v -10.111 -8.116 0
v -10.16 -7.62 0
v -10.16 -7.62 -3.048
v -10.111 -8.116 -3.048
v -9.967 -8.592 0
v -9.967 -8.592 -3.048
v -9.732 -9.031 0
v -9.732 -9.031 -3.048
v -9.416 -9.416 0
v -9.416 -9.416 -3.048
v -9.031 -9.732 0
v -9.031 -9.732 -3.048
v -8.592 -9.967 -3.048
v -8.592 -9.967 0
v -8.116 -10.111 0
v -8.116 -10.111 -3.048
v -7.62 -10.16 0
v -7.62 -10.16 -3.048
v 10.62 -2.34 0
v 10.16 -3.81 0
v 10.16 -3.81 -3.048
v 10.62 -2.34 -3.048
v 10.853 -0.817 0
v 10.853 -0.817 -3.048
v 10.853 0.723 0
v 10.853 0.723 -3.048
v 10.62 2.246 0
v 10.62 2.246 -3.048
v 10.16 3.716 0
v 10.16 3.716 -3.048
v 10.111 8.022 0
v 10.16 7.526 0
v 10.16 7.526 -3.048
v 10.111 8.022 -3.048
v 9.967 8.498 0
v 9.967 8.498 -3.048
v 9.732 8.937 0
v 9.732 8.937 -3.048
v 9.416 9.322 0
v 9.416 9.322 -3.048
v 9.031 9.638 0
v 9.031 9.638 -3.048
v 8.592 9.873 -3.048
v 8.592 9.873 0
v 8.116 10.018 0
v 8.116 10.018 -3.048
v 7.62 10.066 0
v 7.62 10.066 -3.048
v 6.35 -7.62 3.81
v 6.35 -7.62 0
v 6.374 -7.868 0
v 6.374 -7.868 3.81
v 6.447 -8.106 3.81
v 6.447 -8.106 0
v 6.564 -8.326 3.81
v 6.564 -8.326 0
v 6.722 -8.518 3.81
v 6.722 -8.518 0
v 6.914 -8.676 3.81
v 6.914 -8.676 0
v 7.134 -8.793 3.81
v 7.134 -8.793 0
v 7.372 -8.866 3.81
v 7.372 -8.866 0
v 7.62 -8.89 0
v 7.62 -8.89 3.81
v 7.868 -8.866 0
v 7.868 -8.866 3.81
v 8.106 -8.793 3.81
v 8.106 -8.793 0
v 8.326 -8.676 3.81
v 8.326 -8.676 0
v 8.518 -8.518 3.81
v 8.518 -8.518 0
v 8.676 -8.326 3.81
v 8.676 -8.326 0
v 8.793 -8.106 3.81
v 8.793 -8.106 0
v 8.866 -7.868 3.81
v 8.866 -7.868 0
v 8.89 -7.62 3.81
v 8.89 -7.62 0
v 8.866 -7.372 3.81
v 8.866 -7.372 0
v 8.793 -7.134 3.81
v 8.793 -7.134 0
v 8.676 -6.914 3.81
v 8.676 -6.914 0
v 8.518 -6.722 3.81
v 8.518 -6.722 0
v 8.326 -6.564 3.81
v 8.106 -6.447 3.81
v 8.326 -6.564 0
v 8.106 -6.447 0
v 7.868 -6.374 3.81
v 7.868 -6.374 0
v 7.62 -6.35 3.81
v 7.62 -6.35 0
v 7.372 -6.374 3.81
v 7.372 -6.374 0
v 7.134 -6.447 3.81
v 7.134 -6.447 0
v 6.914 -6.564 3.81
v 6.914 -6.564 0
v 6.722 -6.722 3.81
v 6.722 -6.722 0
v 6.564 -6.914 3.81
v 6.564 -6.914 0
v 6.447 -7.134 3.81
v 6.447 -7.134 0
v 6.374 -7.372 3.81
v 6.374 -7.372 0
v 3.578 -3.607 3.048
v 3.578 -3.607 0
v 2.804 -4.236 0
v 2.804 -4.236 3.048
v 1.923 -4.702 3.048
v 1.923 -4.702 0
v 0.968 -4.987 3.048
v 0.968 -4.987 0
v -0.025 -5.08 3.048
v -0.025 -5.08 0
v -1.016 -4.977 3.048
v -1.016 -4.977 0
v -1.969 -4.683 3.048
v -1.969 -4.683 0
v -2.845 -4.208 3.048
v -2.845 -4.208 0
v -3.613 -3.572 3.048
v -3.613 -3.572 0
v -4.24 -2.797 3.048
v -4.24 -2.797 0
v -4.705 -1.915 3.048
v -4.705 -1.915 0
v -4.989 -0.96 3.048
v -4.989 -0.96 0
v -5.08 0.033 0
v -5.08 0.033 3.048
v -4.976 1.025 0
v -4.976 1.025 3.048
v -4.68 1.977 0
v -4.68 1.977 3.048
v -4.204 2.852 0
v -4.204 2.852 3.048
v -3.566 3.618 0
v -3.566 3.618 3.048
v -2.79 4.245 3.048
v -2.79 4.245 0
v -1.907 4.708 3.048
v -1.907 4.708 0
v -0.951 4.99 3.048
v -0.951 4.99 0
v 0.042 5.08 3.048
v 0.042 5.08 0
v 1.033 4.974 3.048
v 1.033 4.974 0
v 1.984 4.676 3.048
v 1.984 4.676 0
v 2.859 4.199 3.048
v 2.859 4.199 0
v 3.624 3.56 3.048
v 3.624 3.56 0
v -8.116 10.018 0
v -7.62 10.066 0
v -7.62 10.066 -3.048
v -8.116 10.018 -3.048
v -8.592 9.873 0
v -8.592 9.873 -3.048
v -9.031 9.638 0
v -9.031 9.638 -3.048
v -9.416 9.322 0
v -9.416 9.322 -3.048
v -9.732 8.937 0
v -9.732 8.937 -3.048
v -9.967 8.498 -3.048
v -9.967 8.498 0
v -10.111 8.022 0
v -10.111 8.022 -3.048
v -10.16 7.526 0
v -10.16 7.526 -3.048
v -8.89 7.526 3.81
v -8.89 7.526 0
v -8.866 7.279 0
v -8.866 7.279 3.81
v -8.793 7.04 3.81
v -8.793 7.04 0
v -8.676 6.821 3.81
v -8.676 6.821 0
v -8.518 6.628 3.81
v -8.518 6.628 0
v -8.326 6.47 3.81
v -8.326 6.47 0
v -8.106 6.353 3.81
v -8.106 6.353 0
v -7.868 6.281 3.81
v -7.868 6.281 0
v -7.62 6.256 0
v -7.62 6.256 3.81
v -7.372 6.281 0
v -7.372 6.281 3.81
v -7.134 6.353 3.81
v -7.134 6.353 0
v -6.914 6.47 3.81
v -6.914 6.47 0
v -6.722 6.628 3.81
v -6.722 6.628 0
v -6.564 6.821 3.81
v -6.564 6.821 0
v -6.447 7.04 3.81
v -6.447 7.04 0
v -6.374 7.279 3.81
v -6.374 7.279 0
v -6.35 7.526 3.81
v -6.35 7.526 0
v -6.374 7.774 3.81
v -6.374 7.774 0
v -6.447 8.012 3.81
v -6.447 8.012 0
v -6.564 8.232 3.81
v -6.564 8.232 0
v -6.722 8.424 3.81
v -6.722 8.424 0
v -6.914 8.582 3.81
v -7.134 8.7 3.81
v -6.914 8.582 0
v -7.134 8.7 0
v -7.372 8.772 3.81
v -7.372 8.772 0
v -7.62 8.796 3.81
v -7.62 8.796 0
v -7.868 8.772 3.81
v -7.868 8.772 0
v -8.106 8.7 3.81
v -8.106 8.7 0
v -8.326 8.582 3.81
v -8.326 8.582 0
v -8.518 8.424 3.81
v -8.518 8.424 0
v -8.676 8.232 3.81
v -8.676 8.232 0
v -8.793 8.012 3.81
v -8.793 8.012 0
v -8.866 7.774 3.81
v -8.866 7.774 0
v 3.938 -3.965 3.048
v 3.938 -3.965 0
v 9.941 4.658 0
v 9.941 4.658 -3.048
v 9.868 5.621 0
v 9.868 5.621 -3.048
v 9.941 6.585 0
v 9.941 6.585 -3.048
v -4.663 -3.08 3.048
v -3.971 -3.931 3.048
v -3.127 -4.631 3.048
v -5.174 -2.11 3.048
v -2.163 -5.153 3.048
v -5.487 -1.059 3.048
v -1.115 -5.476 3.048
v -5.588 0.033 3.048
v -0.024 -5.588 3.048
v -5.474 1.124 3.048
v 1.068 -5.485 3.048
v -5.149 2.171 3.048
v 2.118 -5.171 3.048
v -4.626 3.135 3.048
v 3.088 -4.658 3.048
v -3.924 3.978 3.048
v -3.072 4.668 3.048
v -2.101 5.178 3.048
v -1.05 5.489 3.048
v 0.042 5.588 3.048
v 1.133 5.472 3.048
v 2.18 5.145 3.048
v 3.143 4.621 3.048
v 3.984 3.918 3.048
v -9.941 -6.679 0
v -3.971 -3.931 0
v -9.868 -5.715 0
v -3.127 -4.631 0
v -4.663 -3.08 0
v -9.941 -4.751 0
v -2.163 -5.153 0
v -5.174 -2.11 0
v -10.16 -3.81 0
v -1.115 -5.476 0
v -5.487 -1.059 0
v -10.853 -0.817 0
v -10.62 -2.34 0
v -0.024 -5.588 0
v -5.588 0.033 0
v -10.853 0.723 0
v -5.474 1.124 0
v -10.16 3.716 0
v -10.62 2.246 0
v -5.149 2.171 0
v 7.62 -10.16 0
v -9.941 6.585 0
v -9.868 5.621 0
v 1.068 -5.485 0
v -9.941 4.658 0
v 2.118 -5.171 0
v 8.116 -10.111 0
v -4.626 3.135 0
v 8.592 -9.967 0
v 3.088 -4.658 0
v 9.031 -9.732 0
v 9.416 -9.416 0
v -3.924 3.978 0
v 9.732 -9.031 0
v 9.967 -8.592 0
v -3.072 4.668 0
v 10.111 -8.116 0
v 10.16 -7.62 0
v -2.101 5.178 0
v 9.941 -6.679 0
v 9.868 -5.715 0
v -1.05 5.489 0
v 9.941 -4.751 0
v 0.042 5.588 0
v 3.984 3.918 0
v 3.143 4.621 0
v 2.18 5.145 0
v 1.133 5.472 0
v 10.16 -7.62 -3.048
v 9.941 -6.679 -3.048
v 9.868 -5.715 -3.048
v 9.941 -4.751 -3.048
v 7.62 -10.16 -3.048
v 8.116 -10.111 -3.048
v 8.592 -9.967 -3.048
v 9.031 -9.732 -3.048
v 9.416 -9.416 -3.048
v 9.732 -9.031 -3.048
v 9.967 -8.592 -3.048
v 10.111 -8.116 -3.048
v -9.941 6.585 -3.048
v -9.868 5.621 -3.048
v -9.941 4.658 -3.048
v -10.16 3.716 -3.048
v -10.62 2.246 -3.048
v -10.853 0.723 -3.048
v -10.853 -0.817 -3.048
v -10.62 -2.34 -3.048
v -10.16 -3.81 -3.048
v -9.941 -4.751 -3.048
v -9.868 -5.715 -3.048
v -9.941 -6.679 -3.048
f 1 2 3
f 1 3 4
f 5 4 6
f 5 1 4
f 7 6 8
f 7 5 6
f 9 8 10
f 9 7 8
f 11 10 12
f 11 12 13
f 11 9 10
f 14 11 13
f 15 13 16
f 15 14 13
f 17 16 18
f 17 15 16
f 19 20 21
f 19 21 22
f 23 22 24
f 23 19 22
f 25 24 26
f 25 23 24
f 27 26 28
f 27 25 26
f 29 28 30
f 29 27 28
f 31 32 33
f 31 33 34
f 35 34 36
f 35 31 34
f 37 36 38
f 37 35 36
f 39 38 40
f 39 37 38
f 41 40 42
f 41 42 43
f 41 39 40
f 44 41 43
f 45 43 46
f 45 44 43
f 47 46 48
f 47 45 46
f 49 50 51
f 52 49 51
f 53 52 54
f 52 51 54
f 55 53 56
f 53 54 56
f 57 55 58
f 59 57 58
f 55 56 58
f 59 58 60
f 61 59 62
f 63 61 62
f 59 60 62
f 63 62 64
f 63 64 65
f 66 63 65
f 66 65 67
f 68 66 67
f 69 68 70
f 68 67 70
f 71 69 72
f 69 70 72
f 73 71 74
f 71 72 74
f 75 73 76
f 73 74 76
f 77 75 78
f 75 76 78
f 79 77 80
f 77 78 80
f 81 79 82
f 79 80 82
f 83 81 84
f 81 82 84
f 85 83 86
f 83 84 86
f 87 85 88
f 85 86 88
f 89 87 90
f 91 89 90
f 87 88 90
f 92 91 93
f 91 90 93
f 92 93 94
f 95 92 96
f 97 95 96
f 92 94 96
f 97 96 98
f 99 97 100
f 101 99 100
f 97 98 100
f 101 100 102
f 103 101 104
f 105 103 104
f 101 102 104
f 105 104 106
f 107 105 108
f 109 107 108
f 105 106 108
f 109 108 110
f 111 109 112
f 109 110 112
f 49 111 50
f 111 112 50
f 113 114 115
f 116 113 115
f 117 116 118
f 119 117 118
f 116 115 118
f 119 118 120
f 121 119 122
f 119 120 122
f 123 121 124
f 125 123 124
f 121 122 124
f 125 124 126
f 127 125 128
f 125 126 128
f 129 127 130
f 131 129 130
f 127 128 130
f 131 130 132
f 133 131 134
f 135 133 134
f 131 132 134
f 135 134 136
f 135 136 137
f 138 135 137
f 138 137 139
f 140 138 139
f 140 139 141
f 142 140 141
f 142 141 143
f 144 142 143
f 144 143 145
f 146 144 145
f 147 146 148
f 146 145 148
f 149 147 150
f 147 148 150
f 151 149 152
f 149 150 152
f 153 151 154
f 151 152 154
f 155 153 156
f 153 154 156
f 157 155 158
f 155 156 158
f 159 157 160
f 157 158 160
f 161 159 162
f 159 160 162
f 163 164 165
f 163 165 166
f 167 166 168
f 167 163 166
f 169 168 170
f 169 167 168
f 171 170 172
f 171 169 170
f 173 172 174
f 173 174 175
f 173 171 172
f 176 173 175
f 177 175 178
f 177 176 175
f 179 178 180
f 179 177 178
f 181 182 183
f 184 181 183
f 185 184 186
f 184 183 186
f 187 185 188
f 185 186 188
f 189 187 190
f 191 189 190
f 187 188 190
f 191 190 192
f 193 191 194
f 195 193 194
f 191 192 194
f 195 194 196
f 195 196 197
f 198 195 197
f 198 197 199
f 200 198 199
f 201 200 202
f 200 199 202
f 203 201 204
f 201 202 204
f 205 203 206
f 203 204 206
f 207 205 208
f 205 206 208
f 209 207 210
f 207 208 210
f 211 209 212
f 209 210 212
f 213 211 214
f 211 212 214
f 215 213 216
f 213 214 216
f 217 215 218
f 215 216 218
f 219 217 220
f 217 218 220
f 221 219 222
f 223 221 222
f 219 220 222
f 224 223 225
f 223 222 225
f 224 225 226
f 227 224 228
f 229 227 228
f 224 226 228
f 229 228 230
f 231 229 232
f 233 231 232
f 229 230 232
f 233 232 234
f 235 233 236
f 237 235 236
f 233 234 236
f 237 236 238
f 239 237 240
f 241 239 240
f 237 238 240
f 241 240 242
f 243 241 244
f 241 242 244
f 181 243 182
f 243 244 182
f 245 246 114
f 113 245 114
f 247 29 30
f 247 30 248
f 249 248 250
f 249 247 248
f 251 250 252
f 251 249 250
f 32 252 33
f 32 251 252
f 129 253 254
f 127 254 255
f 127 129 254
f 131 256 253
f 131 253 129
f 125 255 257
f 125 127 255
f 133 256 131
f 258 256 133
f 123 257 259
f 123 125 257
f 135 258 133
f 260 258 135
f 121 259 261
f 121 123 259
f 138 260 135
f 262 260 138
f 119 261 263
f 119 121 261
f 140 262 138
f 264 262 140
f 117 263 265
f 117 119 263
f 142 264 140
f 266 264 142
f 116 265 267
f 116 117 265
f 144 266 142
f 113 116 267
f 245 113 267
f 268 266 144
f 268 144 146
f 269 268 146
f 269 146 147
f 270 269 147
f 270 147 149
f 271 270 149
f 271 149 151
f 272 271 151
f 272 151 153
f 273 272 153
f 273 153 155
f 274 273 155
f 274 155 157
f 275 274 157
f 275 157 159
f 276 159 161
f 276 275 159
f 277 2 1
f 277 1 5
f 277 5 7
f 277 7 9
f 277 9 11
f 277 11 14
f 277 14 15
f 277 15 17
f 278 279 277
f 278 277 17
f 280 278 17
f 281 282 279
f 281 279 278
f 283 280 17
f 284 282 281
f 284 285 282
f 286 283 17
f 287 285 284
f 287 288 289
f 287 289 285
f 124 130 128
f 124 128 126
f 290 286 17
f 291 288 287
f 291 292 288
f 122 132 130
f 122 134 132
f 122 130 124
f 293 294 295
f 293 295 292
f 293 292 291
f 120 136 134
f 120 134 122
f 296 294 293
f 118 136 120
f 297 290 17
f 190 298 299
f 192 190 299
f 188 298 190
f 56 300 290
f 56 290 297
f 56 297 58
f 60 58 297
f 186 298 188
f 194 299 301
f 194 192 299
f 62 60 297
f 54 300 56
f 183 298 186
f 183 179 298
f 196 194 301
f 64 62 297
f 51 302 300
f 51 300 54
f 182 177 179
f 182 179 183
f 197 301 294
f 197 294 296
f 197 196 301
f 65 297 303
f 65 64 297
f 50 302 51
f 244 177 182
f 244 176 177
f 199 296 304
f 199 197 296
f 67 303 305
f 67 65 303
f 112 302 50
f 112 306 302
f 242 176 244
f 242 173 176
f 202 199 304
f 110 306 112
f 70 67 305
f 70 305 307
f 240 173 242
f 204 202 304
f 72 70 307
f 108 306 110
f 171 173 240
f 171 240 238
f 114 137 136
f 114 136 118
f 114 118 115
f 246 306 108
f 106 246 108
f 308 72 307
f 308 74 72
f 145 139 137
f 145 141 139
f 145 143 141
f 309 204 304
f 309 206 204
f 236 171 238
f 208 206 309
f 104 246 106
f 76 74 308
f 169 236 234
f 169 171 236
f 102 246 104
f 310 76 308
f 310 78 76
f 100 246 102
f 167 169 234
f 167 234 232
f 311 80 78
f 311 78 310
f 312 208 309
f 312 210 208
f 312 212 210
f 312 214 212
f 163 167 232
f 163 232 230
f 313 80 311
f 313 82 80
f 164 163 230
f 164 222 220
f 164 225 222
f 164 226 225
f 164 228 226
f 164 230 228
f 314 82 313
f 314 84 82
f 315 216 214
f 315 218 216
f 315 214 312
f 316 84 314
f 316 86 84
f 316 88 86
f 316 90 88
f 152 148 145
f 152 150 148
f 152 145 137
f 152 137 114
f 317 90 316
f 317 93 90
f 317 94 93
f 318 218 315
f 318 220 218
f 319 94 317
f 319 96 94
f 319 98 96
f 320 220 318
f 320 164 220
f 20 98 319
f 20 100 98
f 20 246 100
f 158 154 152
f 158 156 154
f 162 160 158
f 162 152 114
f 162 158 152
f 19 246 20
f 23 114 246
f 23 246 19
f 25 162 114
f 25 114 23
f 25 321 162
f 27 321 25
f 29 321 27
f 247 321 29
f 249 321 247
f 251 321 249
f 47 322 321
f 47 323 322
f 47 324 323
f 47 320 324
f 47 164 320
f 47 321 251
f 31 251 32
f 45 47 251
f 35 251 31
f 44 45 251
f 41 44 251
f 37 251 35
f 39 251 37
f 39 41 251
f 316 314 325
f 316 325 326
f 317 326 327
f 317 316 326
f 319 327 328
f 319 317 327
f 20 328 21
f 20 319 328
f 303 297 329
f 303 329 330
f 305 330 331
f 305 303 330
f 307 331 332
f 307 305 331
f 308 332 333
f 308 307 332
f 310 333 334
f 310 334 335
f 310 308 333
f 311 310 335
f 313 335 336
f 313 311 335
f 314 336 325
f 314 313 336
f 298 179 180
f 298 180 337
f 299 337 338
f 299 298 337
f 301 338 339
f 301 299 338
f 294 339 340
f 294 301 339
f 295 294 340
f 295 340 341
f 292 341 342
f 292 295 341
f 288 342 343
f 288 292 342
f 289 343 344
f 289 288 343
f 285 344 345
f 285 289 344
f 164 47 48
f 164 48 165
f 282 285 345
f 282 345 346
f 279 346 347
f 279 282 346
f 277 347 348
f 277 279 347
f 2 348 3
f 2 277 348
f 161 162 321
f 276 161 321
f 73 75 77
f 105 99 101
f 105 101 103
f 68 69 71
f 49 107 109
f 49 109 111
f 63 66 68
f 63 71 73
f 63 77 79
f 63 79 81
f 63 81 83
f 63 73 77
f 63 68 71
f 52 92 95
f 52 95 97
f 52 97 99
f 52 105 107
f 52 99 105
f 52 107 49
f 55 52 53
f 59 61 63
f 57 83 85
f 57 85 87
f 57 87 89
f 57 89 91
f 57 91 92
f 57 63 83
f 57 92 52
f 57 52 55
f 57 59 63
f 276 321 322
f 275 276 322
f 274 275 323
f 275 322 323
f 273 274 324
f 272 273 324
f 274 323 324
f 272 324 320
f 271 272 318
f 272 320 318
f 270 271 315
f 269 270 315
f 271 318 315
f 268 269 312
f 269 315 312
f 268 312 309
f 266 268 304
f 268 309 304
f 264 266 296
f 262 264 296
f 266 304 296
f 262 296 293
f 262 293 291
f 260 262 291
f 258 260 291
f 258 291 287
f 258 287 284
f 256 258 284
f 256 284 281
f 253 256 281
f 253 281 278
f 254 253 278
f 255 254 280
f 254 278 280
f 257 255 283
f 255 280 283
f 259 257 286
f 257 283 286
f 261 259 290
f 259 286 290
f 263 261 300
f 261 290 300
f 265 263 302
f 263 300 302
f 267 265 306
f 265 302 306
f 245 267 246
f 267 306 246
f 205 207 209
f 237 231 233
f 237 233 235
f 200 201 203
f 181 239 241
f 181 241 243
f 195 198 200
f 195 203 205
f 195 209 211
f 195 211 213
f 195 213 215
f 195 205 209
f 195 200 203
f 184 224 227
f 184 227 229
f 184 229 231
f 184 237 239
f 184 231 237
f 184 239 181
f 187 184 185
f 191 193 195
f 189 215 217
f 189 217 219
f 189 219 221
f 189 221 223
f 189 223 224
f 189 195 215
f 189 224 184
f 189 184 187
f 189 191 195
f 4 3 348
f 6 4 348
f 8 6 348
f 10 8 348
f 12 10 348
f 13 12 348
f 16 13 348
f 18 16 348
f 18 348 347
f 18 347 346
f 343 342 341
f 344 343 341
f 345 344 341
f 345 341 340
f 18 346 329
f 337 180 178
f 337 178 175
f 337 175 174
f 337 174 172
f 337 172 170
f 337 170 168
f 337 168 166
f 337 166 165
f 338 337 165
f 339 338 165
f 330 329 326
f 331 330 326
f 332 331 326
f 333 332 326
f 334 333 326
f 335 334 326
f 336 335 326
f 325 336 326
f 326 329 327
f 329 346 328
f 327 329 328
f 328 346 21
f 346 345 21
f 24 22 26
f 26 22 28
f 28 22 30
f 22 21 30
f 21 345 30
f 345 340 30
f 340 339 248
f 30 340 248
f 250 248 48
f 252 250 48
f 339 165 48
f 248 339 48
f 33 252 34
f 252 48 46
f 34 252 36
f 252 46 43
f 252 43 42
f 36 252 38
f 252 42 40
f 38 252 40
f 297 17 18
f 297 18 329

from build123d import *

# Parameters (mm, degrees)
BOSS_EXTRUDE5_DEPTH = 3.048
BOSS_EXTRUDE6_DEPTH = 3.048
PRONGS_R            = 1.27
BOSS_EXTRUDE7_DEPTH = 3.81


with BuildPart() as part:
    # Back Plate → Boss-Extrude5 (new body)
    with BuildSketch(Plane.XY):
        with BuildLine():
            Line((0, -10.16), (7.62, -10.16))
            ThreePointArc((7.62, -10.16), (9.416051224, -9.416051224), (10.16, -7.62))
            ThreePointArc((10.16, -7.62), (9.867513929, -5.715), (10.16, -3.81))
            ThreePointArc((10.16, -3.81), (10.882617987, -0.046833682), (10.16, 3.716332637))
            ThreePointArc((10.16, 3.716332637), (9.867513929, 5.621332637), (10.16, 7.526332637))
            ThreePointArc((10.16, 7.526332637), (9.416051224, 9.322383861), (7.62, 10.066332637))
            Line((7.62, 10.066332637), (-7.62, 10.066332637))
            ThreePointArc((-7.62, 10.066332637), (-9.416051224, 9.322383861), (-10.16, 7.526332637))
            ThreePointArc((-10.16, 7.526332637), (-9.867513929, 5.621332637), (-10.16, 3.716332637))
            ThreePointArc((-10.16, 3.716332637), (-10.882617987, -0.046833682), (-10.16, -3.81))
            ThreePointArc((-10.16, -3.81), (-9.867513929, -5.715), (-10.16, -7.62))
            ThreePointArc((-10.16, -7.62), (-9.416051224, -9.416051224), (-7.62, -10.16))
            Line((-7.62, -10.16), (0, -10.16))
        make_face()
    extrude(amount=-BOSS_EXTRUDE5_DEPTH)

    # Inner Circle → Boss-Extrude6 (add)
    with BuildSketch(Plane.XY):
        with BuildLine():
            Line((3.624386403, 3.559525699), (3.984498069, 3.917846237))
            ThreePointArc((3.984498069, 3.917846237), (-5.58790138, 0.033198873), (3.937664969, -3.96491344))
            Line((3.937664969, -3.96491344), (3.577553303, -3.606592902))
            ThreePointArc((3.577553303, -3.606592902), (-5.079891518, 0.033198873), (3.624386403, 3.559525699))
        make_face()
    extrude(amount=BOSS_EXTRUDE6_DEPTH)

    # Prongs → Boss-Extrude7 (add)
    with BuildSketch(Plane.XY):
        with Locations(Location((-7.62, 7.526332637, 0), (0, 0, 180))):
            Circle(PRONGS_R)
        with Locations(Location((7.62, -7.62, 0), (0, 0, 180))):
            Circle(PRONGS_R)
    extrude(amount=BOSS_EXTRUDE7_DEPTH)


solid = part.part
